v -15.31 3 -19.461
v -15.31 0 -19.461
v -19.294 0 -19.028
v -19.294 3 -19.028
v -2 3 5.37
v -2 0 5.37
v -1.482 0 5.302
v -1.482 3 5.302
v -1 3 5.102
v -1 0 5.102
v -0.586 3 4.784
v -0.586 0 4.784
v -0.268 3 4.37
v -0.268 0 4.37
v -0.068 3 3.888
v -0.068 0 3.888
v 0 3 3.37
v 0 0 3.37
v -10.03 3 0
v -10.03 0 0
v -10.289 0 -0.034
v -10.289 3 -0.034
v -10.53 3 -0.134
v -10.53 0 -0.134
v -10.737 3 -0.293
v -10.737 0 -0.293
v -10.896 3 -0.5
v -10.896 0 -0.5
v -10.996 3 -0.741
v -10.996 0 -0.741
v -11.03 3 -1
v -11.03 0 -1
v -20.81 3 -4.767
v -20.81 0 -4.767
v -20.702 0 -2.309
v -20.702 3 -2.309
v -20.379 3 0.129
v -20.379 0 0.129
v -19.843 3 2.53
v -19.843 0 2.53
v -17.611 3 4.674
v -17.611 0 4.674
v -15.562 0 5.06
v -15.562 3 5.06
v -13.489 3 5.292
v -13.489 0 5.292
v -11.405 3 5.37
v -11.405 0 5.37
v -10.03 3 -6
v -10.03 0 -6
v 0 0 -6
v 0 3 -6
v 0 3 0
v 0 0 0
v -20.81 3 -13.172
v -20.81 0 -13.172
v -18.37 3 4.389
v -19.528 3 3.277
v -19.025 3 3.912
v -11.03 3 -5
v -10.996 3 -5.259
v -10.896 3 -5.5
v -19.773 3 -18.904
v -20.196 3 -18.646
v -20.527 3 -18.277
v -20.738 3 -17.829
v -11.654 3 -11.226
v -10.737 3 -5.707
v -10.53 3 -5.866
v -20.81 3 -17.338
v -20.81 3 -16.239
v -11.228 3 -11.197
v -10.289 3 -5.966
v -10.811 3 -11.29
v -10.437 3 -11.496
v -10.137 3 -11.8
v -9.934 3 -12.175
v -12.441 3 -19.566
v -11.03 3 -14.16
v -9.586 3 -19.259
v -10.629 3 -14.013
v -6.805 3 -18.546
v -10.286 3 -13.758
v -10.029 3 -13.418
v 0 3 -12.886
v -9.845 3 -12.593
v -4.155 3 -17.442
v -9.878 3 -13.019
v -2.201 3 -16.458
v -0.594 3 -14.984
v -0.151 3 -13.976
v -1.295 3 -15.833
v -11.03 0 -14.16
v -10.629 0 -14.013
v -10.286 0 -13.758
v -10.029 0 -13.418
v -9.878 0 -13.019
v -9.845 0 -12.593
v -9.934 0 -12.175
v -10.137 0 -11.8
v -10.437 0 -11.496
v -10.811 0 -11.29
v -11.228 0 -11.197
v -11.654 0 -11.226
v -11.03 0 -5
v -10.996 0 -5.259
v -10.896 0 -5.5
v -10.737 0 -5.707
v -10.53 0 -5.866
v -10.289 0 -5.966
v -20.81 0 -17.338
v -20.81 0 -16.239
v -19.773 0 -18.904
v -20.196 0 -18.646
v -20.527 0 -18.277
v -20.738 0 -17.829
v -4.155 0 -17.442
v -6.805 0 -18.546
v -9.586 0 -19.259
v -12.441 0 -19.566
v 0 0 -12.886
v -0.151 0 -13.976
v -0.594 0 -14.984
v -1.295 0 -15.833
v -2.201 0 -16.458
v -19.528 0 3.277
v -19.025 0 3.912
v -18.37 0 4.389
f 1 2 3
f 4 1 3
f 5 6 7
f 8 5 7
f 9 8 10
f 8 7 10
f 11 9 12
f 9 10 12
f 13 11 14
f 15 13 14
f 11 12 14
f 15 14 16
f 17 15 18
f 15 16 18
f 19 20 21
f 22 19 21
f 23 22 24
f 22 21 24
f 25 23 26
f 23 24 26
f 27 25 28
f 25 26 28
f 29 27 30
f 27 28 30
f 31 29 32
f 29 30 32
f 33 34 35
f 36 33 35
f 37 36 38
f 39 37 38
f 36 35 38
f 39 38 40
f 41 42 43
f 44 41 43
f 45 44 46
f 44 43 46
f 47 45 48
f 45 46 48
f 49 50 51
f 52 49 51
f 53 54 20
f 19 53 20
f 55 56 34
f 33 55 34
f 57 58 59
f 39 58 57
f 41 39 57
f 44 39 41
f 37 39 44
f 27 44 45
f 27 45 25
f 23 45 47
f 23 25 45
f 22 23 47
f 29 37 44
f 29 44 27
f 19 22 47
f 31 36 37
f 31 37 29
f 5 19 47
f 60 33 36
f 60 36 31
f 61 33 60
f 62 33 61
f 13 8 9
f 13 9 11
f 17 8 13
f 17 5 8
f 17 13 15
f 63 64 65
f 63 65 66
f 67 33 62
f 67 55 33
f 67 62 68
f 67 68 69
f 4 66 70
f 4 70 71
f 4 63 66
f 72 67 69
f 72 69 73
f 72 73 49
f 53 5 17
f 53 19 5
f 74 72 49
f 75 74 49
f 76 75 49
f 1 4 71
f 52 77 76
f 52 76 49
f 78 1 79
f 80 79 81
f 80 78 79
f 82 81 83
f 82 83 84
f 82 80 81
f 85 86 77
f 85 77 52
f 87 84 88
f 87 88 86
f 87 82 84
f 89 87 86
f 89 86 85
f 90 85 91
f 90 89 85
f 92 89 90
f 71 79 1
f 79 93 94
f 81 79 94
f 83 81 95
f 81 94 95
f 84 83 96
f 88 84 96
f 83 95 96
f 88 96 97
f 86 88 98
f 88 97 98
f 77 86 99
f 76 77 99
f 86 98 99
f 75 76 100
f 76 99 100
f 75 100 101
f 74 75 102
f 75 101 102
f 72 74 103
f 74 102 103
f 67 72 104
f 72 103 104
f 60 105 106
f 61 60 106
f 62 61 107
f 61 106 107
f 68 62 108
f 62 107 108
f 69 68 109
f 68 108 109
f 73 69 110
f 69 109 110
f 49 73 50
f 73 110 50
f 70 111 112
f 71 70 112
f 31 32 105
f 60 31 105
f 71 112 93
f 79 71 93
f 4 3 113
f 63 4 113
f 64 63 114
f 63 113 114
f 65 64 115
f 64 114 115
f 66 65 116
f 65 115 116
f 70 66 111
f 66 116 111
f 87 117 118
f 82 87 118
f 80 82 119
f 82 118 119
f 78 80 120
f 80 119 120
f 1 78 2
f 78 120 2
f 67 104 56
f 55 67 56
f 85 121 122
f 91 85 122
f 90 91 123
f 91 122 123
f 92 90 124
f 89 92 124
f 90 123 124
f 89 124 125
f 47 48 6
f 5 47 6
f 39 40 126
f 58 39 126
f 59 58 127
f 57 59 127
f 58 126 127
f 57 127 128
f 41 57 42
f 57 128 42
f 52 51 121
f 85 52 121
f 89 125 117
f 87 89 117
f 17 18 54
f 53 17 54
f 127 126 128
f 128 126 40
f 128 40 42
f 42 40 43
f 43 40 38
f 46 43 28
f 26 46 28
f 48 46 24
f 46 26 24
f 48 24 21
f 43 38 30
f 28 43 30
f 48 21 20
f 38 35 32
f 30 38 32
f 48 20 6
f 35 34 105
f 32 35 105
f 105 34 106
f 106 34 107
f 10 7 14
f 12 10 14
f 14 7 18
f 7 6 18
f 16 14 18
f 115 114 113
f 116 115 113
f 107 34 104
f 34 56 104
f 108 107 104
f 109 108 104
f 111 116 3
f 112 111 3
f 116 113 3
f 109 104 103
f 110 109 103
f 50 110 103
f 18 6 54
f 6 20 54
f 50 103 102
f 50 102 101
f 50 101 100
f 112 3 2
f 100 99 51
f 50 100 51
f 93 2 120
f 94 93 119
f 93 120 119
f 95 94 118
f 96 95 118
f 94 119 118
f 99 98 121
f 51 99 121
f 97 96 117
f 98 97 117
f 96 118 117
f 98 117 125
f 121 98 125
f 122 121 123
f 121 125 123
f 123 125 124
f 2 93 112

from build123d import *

# Parameters (mm, degrees)
BOSS_EXTRUDE1_DEPTH = 3


with BuildPart() as part:
    # Sketch1 → Boss-Extrude1 (new body)
    with BuildSketch(Plane(origin=(0, 0, 0), x_dir=(1, 0, 0), z_dir=(0, 1, 0))):
        with BuildLine():
            Line((0, 6), (0, 12.885607037))
            ThreePointArc((0, 12.885607037), (-0.594451952, 14.983759198), (-2.201121246, 16.458286036))
            Line((-2.201121246, 16.458286036), (-4.154505591, 17.441834123))
            ThreePointArc((-4.154505591, 17.441834123), (-9.586112213, 19.258544509), (-15.309892207, 19.461349126))
            Line((-15.309892207, 19.461349126), (-19.293684392, 19.028366911))
            ThreePointArc((-19.293684392, 19.028366911), (-20.375358342, 18.473602904), (-20.81, 17.338319562))
            Line((-20.81, 17.338319562), (-20.81, 16.238803173))
            Line((-20.81, 16.238803173), (-11.03, 14.16))
            ThreePointArc((-11.03, 14.16), (-9.874646135, 12.380911063), (-11.653735072, 11.225557198))
            Line((-11.653735072, 11.225557198), (-20.81, 13.171781389))
            Line((-20.81, 13.171781389), (-20.81, 4.766752866))
            ThreePointArc((-20.81, 4.766752866), (-20.567080075, 1.086466776), (-19.842535307, -2.529961112))
            ThreePointArc((-19.842535307, -2.529961112), (-19.024517018, -3.911631932), (-17.611135307, -4.673550768))
            ThreePointArc((-17.611135307, -4.673550768), (-14.527545315, -5.195342958), (-11.405, -5.37))
            Line((-11.405, -5.37), (-2, -5.37))
            ThreePointArc((-2, -5.37), (-0.585786438, -4.784213562), (0, -3.37))
            Line((0, -3.37), (0, 0))
            Line((0, 0), (-10.03, 0))
            ThreePointArc((-10.03, 0), (-10.737106781, 0.292893219), (-11.03, 1))
            Line((-11.03, 1), (-11.03, 5))
            ThreePointArc((-11.03, 5), (-10.737106781, 5.707106781), (-10.03, 6))
            Line((-10.03, 6), (0, 6))
        make_face()
    extrude(amount=BOSS_EXTRUDE1_DEPTH)


solid = part.part
